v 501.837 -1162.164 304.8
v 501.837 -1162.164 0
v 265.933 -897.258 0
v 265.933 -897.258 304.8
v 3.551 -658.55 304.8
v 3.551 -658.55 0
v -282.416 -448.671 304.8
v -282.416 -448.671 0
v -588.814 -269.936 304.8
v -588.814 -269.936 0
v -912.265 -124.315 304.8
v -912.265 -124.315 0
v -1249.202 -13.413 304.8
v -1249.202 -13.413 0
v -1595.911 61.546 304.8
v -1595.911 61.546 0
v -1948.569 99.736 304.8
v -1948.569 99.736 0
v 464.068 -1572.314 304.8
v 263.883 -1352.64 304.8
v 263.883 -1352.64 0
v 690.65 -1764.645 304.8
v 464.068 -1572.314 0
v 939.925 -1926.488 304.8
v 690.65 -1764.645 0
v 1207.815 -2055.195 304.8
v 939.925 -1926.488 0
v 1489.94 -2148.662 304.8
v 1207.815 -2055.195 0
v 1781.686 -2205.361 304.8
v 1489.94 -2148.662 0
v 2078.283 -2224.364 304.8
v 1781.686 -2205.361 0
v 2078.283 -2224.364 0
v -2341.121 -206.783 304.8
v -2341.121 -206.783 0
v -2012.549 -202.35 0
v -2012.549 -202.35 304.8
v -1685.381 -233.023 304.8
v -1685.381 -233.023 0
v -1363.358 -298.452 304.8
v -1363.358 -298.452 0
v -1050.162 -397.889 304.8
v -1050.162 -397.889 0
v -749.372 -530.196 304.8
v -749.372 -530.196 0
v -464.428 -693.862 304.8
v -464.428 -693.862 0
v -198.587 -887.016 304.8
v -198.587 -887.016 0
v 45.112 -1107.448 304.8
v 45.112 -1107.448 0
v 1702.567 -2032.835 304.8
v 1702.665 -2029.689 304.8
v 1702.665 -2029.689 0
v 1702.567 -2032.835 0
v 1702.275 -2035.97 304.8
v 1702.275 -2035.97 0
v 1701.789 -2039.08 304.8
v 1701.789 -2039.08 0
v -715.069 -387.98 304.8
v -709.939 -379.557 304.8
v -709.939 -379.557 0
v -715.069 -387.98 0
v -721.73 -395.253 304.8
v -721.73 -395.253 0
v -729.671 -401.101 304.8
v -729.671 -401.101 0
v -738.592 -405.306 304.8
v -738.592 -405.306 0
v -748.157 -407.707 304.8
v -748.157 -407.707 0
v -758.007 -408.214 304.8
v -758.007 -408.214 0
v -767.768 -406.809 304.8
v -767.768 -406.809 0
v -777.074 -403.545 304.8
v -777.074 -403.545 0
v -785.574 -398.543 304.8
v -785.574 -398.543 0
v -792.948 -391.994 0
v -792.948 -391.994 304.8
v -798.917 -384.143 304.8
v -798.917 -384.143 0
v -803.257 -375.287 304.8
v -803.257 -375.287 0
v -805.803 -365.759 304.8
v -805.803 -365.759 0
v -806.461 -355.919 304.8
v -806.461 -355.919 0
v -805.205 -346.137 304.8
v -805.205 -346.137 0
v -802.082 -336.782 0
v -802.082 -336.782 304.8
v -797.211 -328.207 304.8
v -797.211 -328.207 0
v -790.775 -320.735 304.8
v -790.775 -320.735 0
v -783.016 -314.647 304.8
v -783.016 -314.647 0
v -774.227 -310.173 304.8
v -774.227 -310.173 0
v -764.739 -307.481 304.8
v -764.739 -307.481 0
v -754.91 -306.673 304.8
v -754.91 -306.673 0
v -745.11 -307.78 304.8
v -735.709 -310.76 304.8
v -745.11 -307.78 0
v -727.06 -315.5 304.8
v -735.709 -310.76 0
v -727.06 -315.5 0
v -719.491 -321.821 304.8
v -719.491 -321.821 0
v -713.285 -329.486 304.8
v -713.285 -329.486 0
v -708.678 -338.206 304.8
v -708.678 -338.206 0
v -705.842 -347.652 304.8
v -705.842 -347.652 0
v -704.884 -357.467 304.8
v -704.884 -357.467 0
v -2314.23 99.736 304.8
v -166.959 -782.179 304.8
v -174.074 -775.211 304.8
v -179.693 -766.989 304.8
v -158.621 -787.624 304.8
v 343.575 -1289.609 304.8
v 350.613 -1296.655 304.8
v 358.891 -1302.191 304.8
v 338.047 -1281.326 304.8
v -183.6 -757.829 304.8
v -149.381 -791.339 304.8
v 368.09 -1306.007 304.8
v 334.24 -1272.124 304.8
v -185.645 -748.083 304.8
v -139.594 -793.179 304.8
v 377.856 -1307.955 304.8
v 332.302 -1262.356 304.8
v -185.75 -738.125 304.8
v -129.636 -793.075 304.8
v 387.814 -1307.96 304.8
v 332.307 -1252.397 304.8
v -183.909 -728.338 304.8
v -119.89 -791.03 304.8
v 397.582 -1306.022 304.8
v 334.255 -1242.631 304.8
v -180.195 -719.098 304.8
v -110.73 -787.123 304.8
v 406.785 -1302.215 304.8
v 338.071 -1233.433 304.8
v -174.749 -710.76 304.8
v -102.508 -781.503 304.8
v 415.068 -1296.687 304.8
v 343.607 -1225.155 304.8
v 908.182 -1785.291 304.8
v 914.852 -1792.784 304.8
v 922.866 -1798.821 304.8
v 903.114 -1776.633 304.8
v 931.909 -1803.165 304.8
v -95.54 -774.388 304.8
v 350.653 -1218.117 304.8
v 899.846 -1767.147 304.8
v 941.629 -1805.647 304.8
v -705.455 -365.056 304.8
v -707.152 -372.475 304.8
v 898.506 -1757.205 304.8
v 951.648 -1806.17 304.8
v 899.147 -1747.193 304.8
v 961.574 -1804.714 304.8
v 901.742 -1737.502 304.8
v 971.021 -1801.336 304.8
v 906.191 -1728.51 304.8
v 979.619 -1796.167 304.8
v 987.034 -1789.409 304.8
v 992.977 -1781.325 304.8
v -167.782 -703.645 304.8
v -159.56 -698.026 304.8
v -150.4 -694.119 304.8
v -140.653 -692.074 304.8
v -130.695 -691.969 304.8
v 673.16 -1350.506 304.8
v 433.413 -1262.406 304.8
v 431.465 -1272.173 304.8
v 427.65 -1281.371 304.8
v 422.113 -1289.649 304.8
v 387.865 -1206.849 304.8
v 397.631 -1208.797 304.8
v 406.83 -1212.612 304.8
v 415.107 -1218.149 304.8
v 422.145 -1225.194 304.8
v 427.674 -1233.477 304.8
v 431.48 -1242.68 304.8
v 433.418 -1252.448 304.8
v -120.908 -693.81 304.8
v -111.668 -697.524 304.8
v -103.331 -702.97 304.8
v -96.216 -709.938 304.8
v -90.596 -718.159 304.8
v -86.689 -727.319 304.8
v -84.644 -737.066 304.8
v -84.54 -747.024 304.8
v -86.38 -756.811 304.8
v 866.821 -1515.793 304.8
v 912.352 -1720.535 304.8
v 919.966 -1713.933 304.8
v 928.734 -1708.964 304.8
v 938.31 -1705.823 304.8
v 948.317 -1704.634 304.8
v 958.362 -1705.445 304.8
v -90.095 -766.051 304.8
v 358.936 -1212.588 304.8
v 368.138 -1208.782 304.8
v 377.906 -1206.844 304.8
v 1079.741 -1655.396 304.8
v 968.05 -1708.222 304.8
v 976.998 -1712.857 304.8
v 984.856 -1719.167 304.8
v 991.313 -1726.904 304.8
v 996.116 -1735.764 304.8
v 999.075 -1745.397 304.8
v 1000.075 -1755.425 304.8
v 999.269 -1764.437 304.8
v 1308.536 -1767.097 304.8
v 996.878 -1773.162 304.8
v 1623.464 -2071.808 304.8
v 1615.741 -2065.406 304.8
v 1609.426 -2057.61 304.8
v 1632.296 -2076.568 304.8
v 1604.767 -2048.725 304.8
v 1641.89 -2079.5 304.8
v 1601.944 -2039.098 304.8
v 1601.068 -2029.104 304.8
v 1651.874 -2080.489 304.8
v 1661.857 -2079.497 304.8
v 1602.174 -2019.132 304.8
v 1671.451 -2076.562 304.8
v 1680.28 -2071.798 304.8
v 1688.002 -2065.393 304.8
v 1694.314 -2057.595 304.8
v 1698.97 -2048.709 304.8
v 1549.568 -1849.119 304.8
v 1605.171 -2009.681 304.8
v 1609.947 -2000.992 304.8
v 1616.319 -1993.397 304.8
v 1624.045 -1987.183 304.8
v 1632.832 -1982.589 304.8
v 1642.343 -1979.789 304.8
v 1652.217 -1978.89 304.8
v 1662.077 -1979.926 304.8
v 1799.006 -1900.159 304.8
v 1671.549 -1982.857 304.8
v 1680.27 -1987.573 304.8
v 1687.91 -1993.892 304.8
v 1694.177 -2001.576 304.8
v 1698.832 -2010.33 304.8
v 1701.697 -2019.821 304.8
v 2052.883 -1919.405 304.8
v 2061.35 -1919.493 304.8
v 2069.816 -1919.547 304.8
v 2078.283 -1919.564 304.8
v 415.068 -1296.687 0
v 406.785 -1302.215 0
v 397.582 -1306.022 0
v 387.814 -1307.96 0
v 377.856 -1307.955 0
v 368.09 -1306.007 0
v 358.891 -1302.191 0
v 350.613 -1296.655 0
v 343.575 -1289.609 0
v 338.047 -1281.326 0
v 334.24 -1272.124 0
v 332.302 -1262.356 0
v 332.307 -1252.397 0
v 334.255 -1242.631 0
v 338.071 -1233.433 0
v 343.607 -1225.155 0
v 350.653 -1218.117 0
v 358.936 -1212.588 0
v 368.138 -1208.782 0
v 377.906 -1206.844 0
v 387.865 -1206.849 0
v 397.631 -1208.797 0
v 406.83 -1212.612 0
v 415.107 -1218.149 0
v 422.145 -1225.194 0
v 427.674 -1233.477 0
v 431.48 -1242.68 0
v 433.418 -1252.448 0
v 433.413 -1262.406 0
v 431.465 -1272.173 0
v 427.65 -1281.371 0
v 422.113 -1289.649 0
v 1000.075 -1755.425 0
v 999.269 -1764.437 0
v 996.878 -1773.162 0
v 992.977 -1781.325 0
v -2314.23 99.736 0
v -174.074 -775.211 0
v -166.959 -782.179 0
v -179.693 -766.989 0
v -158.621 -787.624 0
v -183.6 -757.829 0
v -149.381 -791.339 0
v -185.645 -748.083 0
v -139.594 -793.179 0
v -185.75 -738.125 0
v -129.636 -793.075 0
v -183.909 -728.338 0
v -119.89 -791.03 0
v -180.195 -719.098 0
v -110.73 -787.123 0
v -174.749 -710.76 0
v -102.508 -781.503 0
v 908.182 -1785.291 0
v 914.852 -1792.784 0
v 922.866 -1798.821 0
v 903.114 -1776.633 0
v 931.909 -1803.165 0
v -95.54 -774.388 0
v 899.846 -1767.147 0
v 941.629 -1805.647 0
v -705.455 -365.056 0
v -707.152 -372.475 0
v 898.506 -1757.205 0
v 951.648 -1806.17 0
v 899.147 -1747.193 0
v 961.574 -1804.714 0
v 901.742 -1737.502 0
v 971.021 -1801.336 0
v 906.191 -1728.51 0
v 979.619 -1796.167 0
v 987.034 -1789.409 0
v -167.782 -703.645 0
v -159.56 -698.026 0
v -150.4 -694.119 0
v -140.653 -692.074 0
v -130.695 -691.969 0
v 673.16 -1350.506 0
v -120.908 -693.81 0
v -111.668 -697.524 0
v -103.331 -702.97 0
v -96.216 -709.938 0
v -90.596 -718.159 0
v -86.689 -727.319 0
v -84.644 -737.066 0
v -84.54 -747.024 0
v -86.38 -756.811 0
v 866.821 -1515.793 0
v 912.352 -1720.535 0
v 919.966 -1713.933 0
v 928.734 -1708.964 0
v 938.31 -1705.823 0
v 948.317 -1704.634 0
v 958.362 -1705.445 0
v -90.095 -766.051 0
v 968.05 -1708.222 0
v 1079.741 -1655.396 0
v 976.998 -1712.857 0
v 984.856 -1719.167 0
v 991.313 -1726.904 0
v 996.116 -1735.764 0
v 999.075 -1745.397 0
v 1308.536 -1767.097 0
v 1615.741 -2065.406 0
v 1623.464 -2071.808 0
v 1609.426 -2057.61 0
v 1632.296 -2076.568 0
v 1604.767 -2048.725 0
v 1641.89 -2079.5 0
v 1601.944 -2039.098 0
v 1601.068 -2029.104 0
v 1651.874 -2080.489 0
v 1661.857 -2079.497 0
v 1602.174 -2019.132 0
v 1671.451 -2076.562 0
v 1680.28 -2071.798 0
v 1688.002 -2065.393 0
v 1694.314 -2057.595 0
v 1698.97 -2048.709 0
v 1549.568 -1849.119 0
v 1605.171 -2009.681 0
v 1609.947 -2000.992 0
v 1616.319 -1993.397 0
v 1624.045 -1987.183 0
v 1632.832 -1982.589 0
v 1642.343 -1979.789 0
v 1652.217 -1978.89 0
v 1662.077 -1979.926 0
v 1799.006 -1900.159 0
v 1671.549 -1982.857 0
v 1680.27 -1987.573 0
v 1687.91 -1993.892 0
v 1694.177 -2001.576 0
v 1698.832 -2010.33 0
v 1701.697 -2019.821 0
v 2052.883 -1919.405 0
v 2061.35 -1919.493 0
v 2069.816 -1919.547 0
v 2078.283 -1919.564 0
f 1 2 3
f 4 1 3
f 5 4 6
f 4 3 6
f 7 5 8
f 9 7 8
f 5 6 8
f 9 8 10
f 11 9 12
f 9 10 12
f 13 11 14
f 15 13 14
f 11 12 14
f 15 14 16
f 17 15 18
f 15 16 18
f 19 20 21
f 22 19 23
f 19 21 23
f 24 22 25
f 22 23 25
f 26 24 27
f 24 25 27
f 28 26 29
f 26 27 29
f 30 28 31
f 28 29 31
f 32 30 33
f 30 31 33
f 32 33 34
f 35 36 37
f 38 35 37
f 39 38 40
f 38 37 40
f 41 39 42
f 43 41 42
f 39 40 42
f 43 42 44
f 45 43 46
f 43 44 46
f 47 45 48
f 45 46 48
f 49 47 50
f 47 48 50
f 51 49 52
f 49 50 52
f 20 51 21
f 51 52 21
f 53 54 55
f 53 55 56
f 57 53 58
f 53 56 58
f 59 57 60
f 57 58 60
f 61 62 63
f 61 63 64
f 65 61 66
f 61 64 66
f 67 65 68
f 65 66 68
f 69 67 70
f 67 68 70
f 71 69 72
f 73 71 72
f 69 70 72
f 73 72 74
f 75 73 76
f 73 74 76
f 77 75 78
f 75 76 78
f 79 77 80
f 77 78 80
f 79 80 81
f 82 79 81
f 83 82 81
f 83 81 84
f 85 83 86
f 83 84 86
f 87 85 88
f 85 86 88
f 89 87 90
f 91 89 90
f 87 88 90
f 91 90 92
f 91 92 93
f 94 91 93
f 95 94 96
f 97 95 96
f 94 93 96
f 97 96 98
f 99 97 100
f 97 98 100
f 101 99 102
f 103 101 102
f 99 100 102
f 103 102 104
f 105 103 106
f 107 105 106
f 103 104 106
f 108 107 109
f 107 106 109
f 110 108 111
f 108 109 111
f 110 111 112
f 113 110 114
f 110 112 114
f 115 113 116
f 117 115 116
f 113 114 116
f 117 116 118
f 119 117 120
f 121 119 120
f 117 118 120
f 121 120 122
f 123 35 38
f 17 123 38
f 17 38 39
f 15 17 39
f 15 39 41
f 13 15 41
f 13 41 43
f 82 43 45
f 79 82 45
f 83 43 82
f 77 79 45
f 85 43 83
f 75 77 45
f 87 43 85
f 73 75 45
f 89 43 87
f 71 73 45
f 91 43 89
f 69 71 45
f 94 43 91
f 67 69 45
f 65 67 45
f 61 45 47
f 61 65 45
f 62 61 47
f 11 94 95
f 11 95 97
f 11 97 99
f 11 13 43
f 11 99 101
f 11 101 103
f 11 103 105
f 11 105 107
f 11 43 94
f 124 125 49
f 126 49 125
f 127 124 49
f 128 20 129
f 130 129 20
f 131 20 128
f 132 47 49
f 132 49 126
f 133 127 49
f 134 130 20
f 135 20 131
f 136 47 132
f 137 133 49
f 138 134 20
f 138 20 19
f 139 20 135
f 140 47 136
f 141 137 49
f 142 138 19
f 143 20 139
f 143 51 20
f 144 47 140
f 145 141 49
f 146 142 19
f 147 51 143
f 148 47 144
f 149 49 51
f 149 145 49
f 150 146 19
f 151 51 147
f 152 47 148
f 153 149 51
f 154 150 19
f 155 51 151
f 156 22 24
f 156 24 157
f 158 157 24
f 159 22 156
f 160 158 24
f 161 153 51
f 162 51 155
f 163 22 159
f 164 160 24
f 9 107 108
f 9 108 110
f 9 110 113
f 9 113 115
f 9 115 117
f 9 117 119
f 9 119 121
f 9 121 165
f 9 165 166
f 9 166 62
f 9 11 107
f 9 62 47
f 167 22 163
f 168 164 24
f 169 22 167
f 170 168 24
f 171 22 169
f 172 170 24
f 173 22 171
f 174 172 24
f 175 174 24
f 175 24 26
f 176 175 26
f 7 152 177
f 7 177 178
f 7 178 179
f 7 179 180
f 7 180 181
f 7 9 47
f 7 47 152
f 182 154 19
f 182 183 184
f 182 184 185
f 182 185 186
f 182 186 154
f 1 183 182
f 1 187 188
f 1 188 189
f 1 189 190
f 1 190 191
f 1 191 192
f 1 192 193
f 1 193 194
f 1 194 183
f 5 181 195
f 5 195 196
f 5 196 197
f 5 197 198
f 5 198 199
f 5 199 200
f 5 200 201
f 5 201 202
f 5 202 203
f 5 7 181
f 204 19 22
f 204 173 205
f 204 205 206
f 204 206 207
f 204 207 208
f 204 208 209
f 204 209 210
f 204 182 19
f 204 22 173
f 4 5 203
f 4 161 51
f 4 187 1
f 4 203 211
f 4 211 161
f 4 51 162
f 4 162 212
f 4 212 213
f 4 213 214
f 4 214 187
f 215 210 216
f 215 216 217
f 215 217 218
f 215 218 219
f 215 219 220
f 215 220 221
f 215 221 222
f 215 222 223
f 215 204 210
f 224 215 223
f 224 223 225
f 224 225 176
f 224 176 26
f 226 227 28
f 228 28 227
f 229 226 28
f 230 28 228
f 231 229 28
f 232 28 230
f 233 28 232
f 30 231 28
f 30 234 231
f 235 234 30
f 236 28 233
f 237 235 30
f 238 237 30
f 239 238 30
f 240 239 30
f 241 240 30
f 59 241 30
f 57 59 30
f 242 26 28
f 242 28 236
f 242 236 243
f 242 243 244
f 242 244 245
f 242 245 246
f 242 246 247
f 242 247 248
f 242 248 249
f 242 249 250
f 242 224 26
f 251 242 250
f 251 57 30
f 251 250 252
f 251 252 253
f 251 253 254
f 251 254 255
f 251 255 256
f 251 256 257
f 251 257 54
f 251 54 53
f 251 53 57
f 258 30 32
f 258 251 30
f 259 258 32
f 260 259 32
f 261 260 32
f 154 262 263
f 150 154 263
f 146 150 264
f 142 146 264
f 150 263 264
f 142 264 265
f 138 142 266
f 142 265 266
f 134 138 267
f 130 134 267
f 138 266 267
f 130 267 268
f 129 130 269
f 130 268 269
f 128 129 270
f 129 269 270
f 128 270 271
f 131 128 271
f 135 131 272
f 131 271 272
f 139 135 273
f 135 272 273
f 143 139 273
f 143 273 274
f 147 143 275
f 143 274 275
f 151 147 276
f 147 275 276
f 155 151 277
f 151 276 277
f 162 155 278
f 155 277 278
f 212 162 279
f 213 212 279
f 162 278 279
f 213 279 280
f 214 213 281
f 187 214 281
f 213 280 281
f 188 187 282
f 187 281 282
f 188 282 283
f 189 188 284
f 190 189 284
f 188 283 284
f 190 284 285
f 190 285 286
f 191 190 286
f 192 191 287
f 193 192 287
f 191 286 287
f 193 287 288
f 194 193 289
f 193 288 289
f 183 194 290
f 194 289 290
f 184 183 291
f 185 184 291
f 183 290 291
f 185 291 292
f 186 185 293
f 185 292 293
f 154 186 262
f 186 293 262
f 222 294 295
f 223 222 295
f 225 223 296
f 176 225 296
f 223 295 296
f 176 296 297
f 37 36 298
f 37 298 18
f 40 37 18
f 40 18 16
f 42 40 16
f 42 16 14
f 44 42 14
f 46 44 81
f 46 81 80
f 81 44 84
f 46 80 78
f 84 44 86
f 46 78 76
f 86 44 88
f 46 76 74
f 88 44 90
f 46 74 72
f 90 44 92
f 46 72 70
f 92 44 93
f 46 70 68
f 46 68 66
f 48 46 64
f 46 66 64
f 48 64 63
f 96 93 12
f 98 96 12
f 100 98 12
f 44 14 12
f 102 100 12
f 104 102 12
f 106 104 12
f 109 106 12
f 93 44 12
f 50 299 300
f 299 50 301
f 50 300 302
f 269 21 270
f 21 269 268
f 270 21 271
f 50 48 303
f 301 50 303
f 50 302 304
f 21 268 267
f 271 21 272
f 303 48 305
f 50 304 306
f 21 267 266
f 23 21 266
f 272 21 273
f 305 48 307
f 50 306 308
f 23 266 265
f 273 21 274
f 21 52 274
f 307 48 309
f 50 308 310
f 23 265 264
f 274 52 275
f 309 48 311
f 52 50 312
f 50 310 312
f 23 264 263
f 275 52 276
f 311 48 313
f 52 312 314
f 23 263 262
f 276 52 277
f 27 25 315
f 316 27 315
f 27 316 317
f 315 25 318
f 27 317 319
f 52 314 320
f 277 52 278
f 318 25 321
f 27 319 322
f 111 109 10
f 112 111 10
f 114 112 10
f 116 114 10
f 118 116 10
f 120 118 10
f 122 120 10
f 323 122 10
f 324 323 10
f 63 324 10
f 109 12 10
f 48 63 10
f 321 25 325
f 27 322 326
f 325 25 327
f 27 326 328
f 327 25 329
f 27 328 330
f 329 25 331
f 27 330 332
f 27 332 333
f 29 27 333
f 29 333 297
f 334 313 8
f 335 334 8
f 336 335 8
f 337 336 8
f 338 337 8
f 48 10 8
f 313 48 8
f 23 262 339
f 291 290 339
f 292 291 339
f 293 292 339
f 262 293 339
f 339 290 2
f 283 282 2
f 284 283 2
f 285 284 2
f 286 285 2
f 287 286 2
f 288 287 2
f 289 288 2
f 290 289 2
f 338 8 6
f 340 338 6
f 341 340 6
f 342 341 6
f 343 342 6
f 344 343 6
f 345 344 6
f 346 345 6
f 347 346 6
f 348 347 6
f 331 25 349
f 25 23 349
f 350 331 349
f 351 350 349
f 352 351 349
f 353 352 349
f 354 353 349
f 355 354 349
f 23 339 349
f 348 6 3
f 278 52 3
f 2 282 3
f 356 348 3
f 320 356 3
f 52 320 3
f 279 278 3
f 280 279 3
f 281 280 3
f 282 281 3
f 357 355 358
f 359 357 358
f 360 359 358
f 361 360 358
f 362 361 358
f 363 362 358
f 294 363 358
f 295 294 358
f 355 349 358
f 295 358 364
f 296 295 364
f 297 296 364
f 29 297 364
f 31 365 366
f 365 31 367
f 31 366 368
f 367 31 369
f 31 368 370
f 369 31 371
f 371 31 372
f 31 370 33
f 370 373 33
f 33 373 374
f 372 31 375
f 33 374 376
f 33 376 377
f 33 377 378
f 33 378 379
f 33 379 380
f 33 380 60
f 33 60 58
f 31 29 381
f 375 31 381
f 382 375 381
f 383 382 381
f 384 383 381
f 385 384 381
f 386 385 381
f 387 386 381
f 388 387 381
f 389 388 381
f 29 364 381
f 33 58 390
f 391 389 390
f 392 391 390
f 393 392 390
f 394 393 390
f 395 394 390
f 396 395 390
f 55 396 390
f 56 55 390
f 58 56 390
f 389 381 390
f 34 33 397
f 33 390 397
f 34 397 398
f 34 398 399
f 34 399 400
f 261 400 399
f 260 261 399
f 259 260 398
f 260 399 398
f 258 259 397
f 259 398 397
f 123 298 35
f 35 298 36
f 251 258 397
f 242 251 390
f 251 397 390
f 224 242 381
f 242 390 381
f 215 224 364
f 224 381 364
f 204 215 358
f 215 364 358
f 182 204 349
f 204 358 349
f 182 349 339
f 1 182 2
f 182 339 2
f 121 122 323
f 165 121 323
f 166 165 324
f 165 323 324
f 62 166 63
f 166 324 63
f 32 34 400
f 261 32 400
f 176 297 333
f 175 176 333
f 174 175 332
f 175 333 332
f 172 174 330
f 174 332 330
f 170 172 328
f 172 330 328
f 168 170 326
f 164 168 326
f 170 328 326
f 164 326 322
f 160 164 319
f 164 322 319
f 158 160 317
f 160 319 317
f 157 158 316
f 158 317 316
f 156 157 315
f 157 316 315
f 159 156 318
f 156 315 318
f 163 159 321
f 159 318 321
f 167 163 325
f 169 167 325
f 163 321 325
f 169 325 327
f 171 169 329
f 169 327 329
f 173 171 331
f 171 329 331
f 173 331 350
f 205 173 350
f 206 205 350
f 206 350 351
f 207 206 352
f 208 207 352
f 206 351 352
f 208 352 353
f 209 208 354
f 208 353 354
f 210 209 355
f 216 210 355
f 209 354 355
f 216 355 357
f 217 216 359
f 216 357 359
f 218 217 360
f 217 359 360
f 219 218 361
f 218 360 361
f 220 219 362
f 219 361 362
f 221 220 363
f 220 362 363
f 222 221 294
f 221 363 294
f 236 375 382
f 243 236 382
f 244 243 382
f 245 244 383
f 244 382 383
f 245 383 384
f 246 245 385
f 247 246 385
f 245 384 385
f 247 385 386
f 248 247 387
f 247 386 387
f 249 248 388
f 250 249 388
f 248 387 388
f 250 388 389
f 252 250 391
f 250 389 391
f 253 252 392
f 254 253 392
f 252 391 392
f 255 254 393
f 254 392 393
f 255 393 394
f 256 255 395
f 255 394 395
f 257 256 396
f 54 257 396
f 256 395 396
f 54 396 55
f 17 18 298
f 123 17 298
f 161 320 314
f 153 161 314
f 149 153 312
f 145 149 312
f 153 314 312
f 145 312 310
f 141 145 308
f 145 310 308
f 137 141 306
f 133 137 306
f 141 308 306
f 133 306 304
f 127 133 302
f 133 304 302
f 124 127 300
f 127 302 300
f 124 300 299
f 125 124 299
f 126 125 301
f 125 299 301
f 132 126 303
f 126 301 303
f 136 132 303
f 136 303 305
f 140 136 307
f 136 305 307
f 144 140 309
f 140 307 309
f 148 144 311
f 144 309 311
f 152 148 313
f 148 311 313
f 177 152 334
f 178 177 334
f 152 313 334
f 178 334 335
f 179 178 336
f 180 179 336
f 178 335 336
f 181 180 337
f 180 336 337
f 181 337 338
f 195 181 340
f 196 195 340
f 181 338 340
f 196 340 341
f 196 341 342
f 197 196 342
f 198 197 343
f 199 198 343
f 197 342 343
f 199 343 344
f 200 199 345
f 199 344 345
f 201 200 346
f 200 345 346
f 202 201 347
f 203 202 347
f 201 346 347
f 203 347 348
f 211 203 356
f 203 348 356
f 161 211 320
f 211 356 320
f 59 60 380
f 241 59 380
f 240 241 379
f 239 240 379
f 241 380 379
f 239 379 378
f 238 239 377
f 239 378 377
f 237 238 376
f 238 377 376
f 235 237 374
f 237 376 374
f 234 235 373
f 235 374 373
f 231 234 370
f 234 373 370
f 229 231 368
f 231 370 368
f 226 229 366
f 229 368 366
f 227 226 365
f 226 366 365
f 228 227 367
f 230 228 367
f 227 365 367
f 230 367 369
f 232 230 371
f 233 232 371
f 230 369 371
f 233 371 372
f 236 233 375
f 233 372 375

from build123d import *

# Parameters (mm, degrees)
F1_DEPTH = 304.8
F2_DEPTH = 304.8
F3_DEPTH = 304.8


with BuildPart() as f1:
    # F0 (on Top) → F1 (new body)
    with BuildSketch(Plane.XY):
        with BuildLine():
            ThreePointArc((501.8373213462, -1162.1641319538), (-588.8138343541, -269.9358016899), (-1948.5691277783, 99.7355101007))
            Line((-1948.5691277783, 99.7355101007), (-2314.2295336755, 99.7355101007))
            Line((-2314.2295336755, 99.7355101007), (-2341.1214825581, -206.7828963515))
            ThreePointArc((-2341.1214825581, -206.7828963515), (-897.9972664569, -460.0197324886), (263.8832180742, -1352.6395496224))
            ThreePointArc((263.8832180742, -1352.6395496224), (346.7538874407, -1450.5053929426), (434.8963853673, -1543.651360055))
            Line((434.8963853674, -1543.651360055), (542.6594588202, -1435.8882866022))
            Line((542.6594588202, -1435.8882866022), (650.422532273, -1328.1252131493))
            ThreePointArc((650.422532273, -1328.1252131493), (573.8397062056, -1247.1951105763), (501.8373213462, -1162.1641319538))
        make_face()
        with BuildLine():
            ThreePointArc((433.6602697102, -1257.4018407881), (428.777505301, -1279.1330965203), (415.0678494071, -1296.6868482346))
            ThreePointArc((415.0678494071, -1296.6868482346), (343.5137867979, -1289.5342898455), (350.8030686318, -1217.9940260933))
            ThreePointArc((350.8030686318, -1217.9940260933), (404.6792314777, -1211.5262164611), (433.6602697102, -1257.4018407881))
        make_face(mode=Mode.SUBTRACT)
        with BuildLine():
            ThreePointArc((-84.344806107, -742.5742430084), (-87.225399321, -759.4375301517), (-95.5404932439, -774.3883657001))
            ThreePointArc((-95.5404932439, -774.3883657001), (-166.6460909386, -782.4278382534), (-175.2452126635, -711.3877492331))
            ThreePointArc((-175.2452126635, -711.3877492331), (-118.6593678822, -694.5235372224), (-84.344806107, -742.5742430084))
        make_face(mode=Mode.SUBTRACT)
        with BuildLine():
            ThreePointArc((-704.8844563159, -357.4674311671), (-706.1641040933, -368.7976878168), (-709.9385789832, -379.5571280202))
            ThreePointArc((-709.9385789832, -379.5571280202), (-777.4132569884, -403.385828584), (-801.7725267064, -336.1008739413))
            ThreePointArc((-801.7725267064, -336.1008739413), (-744.744483186, -307.8593976653), (-704.8844563159, -357.4674311671))
        make_face(mode=Mode.SUBTRACT)
    extrude(amount=F1_DEPTH)

    # F0 (on Top) → F2 (join)
    with BuildSketch(Plane.XY):
        with BuildLine():
            ThreePointArc((906.1913762496, -1728.5099648127), (716.5424919701, -1591.9922998257), (542.6594588202, -1435.8882866021))
            Line((542.6594588202, -1435.8882866022), (434.8963853674, -1543.651360055))
            ThreePointArc((434.8963853673, -1543.651360055), (1188.8886903633, -2047.4529114088), (2078.283255523, -2224.3644898993))
            Line((2078.283255523, -2224.3644898993), (2078.283255523, -2071.9644898993))
            ThreePointArc((2078.283255523, -2071.9644898993), (2065.5830383492, -2071.9273538089), (2052.883255523, -2071.8159468075))
            ThreePointArc((2052.883255523, -2071.8159468075), (1876.6707861859, -2062.5857662613), (1701.7893257852, -2039.0803330402))
            ThreePointArc((1701.7893257852, -2039.0803330402), (1641.8902756154, -2079.500001974), (1602.1739450511, -2019.1323042006))
            ThreePointArc((1602.1739450511, -2019.1323042006), (1288.5725550934, -1923.2914051002), (992.9765867594, -1781.3254471087))
            ThreePointArc((992.9765867594, -1781.3254471087), (922.8655503609, -1798.8208300162), (906.1913762496, -1728.5099648127))
        make_face()
    extrude(amount=F2_DEPTH)

    # F0 (on Top) → F3 (join)
    with BuildSketch(Plane.XY):
        with BuildLine():
            ThreePointArc((2052.883255523, -1919.4047351522), (1293.8123824371, -1760.9573552803), (650.422532273, -1328.1252131493))
            Line((650.422532273, -1328.1252131493), (542.6594588202, -1435.8882866022))
            ThreePointArc((542.6594588202, -1435.8882866021), (716.5424919701, -1591.9922998257), (906.1913762496, -1728.5099648127))
            ThreePointArc((906.1913762496, -1728.5099648127), (963.2748646873, -1706.5924137874), (1000.0750979075, -1755.4252565278))
            ThreePointArc((1000.0750979075, -1755.4252565278), (998.2683404705, -1768.8529213717), (992.9765867594, -1781.3254471087))
            ThreePointArc((992.9765867594, -1781.3254471087), (1288.5725550934, -1923.2914051002), (1602.1739450511, -2019.1323042006))
            ThreePointArc((1602.1739450511, -2019.1323042006), (1657.172317012, -1979.1669084337), (1702.6649722991, -2029.6889045552))
            ThreePointArc((1702.6649722991, -2029.6889045552), (1702.4455869508, -2034.4049857092), (1701.7893257852, -2039.0803330402))
            ThreePointArc((1701.7893257852, -2039.0803330402), (1876.6707861859, -2062.5857662613), (2052.883255523, -2071.8159468075))
            Line((2052.883255523, -2071.8159468075), (2052.883255523, -1919.4047351522))
        make_face()
        with BuildLine():
            ThreePointArc((2078.283255523, -1919.5644898993), (2065.5830043289, -1919.5245508176), (2052.883255523, -1919.4047351522))
            Line((2052.883255523, -1919.4047351522), (2052.883255523, -2071.8159468075))
            ThreePointArc((2052.883255523, -2071.8159468075), (2065.5830383492, -2071.9273538089), (2078.283255523, -2071.9644898993))
            Line((2078.283255523, -2071.9644898993), (2078.283255523, -1919.5644898993))
        make_face()
    extrude(amount=F3_DEPTH)


solid = f1.part
